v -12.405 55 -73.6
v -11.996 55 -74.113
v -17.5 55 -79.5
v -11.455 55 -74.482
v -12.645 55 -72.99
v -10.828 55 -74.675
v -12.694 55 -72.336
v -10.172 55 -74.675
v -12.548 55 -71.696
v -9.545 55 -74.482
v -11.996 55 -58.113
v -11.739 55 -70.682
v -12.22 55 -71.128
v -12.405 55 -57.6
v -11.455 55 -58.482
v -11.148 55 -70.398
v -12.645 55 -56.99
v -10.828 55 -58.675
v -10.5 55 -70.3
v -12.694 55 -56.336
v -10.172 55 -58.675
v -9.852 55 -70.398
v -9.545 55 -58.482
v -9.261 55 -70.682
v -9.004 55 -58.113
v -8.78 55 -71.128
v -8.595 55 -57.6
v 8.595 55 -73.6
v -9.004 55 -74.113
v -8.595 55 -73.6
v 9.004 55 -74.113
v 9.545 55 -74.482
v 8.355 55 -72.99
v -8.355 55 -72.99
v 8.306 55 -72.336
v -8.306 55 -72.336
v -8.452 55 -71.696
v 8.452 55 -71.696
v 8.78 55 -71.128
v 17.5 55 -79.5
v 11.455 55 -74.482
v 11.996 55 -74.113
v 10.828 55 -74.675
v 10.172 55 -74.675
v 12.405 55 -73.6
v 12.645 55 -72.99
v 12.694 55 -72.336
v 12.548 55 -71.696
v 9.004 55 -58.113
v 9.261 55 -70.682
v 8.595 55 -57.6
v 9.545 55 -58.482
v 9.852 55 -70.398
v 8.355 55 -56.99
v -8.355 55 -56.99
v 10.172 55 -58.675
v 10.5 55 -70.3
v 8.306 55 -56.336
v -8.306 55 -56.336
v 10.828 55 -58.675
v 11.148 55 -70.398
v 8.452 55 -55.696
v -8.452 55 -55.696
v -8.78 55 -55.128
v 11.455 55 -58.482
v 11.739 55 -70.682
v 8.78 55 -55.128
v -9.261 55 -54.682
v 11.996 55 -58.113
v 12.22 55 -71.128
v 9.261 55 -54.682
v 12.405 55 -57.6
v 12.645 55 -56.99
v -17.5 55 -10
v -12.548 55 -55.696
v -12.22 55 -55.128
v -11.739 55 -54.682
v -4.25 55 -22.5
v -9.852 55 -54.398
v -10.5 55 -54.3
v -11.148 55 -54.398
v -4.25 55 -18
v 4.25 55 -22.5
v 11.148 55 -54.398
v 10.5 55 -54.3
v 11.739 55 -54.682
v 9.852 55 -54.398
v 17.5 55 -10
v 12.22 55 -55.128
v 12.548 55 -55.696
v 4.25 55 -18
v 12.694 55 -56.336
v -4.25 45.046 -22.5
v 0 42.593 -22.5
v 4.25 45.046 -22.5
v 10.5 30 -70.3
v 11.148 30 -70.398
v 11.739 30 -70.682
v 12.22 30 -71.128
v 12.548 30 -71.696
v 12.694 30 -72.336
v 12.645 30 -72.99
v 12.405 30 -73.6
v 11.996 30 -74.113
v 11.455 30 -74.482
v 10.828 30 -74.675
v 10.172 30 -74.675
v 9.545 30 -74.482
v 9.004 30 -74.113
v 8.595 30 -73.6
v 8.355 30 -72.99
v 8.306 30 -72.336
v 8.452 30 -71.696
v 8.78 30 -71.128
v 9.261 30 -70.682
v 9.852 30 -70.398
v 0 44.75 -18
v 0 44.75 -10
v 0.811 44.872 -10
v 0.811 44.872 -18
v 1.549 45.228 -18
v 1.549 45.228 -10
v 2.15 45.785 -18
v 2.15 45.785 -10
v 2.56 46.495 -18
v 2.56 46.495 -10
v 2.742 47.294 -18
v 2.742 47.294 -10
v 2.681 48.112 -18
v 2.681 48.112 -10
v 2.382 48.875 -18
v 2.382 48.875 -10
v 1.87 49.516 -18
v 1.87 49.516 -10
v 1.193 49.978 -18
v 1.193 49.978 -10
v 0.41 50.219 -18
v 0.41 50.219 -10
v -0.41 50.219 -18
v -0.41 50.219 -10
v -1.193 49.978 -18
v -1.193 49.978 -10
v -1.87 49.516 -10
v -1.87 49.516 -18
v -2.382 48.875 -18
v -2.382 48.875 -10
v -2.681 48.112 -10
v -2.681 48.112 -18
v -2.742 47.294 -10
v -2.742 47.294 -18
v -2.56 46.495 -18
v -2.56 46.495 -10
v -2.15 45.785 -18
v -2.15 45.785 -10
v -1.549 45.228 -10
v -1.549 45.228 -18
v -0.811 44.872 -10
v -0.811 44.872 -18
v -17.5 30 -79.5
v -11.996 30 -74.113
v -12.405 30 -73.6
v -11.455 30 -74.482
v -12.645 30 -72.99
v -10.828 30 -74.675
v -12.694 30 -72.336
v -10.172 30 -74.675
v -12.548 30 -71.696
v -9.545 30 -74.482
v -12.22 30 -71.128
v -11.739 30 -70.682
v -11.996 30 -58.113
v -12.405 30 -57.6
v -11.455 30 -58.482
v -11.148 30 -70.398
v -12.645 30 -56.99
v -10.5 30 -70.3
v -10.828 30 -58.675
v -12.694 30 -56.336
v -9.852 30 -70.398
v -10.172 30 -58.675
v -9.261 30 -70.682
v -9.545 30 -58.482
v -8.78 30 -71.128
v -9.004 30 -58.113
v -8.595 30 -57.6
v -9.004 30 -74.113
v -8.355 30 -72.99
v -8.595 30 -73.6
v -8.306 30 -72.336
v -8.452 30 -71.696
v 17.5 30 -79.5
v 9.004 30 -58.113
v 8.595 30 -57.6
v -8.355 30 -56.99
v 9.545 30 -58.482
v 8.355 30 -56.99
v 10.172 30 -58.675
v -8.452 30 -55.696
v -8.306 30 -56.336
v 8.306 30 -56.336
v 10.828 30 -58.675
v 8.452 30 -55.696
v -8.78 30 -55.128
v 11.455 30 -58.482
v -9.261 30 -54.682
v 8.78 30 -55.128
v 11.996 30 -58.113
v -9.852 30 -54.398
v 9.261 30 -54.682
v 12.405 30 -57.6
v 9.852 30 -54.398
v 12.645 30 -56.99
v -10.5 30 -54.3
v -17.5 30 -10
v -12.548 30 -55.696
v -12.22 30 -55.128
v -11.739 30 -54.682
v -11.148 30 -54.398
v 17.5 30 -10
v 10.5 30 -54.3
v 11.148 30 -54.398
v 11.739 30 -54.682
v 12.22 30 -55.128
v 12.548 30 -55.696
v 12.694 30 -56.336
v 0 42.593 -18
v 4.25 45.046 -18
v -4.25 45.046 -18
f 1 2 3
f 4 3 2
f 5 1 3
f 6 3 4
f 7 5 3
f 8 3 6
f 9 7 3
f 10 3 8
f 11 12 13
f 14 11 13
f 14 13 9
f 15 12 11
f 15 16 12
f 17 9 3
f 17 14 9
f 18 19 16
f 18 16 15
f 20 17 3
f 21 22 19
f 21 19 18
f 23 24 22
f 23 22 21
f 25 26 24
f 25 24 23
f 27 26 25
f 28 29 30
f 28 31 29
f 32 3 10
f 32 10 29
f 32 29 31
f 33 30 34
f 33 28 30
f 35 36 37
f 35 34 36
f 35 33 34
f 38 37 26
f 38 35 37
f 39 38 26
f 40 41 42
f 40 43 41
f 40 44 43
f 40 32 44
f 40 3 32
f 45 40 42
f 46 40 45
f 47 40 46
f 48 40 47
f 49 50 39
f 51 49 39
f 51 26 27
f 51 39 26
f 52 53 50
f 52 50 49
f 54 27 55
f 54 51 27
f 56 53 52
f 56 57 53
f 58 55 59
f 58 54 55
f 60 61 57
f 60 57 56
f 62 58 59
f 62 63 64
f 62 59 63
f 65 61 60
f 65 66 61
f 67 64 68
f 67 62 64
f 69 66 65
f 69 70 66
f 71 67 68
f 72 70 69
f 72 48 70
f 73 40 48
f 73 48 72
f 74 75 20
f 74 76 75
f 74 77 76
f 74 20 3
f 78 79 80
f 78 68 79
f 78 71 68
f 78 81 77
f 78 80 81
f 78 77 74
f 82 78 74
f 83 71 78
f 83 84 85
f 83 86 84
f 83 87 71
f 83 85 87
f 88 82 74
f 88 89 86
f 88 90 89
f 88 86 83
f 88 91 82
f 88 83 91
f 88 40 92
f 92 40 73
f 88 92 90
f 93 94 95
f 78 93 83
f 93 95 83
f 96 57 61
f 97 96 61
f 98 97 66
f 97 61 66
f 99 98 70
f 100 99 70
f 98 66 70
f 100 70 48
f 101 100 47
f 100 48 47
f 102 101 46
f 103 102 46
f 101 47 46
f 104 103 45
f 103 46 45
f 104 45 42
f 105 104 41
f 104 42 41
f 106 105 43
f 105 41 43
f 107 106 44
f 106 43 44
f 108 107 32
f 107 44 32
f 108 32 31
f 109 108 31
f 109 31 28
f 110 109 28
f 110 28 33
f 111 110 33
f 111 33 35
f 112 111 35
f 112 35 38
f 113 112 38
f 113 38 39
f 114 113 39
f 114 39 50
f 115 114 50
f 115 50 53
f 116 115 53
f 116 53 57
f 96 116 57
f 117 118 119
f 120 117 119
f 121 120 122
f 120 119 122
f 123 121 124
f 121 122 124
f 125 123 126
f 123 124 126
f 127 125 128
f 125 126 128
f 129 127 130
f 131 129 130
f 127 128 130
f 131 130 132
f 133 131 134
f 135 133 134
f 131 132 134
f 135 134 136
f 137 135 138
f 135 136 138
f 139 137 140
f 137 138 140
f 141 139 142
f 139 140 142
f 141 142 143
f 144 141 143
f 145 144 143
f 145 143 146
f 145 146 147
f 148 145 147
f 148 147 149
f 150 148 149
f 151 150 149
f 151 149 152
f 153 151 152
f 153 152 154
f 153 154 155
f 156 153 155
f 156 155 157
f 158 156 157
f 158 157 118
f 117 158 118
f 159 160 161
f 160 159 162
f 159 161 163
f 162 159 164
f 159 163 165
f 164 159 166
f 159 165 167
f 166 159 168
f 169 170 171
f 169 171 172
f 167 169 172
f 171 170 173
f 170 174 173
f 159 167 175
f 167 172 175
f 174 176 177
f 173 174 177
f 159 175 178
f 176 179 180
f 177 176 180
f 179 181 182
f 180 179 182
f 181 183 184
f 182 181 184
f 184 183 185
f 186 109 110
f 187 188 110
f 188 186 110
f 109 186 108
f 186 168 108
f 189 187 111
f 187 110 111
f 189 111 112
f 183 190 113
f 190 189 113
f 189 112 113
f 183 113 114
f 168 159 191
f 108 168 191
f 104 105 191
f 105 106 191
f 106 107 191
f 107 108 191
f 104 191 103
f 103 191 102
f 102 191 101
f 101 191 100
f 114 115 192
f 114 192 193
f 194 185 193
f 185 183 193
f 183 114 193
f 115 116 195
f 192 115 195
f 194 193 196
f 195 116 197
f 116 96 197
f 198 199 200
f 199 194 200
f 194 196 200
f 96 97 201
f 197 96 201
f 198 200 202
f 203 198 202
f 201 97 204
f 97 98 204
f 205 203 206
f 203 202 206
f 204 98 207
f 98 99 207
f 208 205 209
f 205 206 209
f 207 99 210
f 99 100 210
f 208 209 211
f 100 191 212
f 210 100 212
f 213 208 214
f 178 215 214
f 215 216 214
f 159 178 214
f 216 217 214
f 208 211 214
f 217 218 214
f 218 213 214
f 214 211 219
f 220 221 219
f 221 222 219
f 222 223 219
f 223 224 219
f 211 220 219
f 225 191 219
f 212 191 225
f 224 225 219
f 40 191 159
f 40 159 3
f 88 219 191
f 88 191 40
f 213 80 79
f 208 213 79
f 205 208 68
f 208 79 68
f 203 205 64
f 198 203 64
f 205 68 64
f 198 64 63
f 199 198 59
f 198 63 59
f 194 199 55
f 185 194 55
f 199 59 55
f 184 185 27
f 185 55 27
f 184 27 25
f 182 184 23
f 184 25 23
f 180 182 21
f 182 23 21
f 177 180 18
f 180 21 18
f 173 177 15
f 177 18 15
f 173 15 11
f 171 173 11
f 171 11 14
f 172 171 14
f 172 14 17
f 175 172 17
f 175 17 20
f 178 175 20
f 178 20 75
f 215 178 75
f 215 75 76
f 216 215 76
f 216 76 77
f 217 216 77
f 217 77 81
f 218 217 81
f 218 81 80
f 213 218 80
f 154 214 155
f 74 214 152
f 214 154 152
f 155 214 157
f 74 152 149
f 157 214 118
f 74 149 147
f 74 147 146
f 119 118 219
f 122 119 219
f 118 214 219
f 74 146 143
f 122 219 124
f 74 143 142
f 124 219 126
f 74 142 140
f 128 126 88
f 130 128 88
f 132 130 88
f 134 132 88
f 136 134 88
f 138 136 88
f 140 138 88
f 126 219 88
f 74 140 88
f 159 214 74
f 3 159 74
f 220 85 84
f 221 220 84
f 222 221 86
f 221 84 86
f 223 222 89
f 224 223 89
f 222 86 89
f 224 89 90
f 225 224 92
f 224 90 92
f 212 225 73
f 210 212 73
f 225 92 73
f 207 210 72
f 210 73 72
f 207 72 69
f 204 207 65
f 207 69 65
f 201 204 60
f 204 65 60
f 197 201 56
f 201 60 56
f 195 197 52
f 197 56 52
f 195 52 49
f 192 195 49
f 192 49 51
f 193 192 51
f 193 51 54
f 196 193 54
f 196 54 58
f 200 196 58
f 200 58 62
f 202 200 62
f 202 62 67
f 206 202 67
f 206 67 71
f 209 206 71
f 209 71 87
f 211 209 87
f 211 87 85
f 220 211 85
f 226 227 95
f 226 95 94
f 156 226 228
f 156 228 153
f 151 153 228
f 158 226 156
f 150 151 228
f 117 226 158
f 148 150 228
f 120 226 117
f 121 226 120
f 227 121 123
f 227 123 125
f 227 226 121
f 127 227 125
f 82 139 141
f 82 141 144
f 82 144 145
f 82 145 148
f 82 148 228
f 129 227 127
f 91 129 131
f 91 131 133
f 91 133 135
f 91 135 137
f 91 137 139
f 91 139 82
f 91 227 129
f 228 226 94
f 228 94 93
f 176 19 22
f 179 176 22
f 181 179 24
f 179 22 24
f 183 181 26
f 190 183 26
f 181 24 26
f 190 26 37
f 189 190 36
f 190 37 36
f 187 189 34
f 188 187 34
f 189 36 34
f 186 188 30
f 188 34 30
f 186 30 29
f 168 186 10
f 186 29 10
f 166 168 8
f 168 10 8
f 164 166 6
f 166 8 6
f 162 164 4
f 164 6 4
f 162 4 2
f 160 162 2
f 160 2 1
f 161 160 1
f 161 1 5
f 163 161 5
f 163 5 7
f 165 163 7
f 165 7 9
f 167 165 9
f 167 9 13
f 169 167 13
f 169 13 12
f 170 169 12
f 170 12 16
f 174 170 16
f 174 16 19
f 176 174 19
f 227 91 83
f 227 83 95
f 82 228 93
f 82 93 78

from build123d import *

# Parameters (mm, degrees)
SKETCH_W      = 25
SKETCH_H      = 69.5
PAD_DEPTH     = 17.5
POCKET_DEPTH  = 4.5
SKETCH003_R   = 2.75
HOLE001_DEPTH = 12
SKETCH004_R   = 2.2
HOLE_DEPTH    = 25.001


with BuildPart() as part:
    # Sketch → Pad (new body, symmetric)
    with BuildSketch(Plane.YZ):
        with Locations((42.5, -44.75)):
            Rectangle(SKETCH_W, SKETCH_H)
    extrude(amount=PAD_DEPTH, both=True)

    # Sketch002 → Pocket (cut)
    with BuildSketch(Plane(origin=(0, 0, -18), x_dir=(0, -1, 0), z_dir=(0, 0, 1))):
        Polygon((-55, -4.25), (-55, 4.25), (-45.046262, 4.25), (-42.592523, 0), (-45.046262, -4.25), align=None)
    extrude(amount=-POCKET_DEPTH, mode=Mode.SUBTRACT)

    # Sketch003 (on Face2 of Pocket) → Hole001 (cut)
    with BuildSketch(Plane(origin=(0, 0, -10), x_dir=(0, -1, 0), z_dir=(0, 0, 1))):
        with Locations((-47.5, 0)):
            Circle(SKETCH003_R)
    extrude(amount=-HOLE001_DEPTH, mode=Mode.SUBTRACT)

    # Sketch004 (on Face6 of Hole001) → Hole (cut, through all)
    with BuildSketch(Plane.ZX.offset(55)):
        with Locations((-72.5, 10.5)):
            Circle(SKETCH004_R)
        with Locations((-56.5, 10.5)):
            Circle(SKETCH004_R)
        with Locations((-72.5, -10.5)):
            Circle(SKETCH004_R)
        with Locations((-56.5, -10.5)):
            Circle(SKETCH004_R)
    extrude(amount=-HOLE_DEPTH, mode=Mode.SUBTRACT)


solid = part.part
